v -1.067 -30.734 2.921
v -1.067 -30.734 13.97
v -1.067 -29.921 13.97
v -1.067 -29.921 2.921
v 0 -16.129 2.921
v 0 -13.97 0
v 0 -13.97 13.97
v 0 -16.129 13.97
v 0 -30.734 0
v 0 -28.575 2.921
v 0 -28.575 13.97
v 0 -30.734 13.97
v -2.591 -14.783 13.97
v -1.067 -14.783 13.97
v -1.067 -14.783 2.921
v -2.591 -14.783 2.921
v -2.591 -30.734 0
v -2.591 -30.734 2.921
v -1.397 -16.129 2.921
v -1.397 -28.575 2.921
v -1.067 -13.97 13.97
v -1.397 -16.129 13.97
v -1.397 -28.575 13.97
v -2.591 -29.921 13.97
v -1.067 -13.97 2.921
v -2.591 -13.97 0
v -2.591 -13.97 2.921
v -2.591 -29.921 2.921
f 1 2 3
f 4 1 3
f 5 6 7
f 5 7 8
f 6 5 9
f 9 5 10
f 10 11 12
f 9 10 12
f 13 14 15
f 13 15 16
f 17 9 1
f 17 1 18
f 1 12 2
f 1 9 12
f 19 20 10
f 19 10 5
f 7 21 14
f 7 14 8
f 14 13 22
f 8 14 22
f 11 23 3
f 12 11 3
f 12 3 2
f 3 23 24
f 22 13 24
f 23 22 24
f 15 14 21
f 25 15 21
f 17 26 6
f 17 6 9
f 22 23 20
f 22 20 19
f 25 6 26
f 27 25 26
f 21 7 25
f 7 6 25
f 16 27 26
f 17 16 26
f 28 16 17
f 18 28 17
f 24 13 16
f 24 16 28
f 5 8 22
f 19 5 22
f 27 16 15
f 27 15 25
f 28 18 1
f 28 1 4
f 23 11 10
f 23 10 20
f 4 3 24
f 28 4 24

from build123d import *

# Parameters (mm, degrees)
F0_W     = 16.764
F0_H     = 2.5908
F1_DEPTH = 13.97
F2_W     = 0.8128
F2_H     = 1.524
F2_W_2   = 12.446
F2_H_2   = 1.397
F3_DEPTH = 11.049
F4_ANGLE = -90
F5_ANGLE = 90


with BuildPart() as f1:
    # F0 (on Front) → F1 (new body)
    with BuildSketch(Plane.XZ):
        with Locations((8.382, 1.2954)):
            Rectangle(F0_W, F0_H)
    extrude(amount=F1_DEPTH)

    # F2 (on face) → F3 (cut)
    with BuildSketch(Plane(origin=(0, 0, 0), x_dir=(-1, 0, 0), z_dir=(0, 1, 0))):
        with Locations((-16.3576, 1.8288)):
            Rectangle(F2_W, F2_H)
        with Locations((-0.4064, 1.8288)):
            Rectangle(F2_W, F2_H)
        with Locations((-8.382, 0.6985)):
            Rectangle(F2_W_2, F2_H_2)
    extrude(amount=-F3_DEPTH, mode=Mode.SUBTRACT)


with BuildPart() as f1_1:
    # F4: moved
    add(f1.part.rotate(Axis((0, -13.97, 1.2954), (0, 0, 1)), F4_ANGLE))


with BuildPart() as f1_2:
    # F5: moved
    add(f1_1.part.rotate(Axis((0, -22.352, 0), (0, -1, 0)), F5_ANGLE))


solid = f1_2.part
